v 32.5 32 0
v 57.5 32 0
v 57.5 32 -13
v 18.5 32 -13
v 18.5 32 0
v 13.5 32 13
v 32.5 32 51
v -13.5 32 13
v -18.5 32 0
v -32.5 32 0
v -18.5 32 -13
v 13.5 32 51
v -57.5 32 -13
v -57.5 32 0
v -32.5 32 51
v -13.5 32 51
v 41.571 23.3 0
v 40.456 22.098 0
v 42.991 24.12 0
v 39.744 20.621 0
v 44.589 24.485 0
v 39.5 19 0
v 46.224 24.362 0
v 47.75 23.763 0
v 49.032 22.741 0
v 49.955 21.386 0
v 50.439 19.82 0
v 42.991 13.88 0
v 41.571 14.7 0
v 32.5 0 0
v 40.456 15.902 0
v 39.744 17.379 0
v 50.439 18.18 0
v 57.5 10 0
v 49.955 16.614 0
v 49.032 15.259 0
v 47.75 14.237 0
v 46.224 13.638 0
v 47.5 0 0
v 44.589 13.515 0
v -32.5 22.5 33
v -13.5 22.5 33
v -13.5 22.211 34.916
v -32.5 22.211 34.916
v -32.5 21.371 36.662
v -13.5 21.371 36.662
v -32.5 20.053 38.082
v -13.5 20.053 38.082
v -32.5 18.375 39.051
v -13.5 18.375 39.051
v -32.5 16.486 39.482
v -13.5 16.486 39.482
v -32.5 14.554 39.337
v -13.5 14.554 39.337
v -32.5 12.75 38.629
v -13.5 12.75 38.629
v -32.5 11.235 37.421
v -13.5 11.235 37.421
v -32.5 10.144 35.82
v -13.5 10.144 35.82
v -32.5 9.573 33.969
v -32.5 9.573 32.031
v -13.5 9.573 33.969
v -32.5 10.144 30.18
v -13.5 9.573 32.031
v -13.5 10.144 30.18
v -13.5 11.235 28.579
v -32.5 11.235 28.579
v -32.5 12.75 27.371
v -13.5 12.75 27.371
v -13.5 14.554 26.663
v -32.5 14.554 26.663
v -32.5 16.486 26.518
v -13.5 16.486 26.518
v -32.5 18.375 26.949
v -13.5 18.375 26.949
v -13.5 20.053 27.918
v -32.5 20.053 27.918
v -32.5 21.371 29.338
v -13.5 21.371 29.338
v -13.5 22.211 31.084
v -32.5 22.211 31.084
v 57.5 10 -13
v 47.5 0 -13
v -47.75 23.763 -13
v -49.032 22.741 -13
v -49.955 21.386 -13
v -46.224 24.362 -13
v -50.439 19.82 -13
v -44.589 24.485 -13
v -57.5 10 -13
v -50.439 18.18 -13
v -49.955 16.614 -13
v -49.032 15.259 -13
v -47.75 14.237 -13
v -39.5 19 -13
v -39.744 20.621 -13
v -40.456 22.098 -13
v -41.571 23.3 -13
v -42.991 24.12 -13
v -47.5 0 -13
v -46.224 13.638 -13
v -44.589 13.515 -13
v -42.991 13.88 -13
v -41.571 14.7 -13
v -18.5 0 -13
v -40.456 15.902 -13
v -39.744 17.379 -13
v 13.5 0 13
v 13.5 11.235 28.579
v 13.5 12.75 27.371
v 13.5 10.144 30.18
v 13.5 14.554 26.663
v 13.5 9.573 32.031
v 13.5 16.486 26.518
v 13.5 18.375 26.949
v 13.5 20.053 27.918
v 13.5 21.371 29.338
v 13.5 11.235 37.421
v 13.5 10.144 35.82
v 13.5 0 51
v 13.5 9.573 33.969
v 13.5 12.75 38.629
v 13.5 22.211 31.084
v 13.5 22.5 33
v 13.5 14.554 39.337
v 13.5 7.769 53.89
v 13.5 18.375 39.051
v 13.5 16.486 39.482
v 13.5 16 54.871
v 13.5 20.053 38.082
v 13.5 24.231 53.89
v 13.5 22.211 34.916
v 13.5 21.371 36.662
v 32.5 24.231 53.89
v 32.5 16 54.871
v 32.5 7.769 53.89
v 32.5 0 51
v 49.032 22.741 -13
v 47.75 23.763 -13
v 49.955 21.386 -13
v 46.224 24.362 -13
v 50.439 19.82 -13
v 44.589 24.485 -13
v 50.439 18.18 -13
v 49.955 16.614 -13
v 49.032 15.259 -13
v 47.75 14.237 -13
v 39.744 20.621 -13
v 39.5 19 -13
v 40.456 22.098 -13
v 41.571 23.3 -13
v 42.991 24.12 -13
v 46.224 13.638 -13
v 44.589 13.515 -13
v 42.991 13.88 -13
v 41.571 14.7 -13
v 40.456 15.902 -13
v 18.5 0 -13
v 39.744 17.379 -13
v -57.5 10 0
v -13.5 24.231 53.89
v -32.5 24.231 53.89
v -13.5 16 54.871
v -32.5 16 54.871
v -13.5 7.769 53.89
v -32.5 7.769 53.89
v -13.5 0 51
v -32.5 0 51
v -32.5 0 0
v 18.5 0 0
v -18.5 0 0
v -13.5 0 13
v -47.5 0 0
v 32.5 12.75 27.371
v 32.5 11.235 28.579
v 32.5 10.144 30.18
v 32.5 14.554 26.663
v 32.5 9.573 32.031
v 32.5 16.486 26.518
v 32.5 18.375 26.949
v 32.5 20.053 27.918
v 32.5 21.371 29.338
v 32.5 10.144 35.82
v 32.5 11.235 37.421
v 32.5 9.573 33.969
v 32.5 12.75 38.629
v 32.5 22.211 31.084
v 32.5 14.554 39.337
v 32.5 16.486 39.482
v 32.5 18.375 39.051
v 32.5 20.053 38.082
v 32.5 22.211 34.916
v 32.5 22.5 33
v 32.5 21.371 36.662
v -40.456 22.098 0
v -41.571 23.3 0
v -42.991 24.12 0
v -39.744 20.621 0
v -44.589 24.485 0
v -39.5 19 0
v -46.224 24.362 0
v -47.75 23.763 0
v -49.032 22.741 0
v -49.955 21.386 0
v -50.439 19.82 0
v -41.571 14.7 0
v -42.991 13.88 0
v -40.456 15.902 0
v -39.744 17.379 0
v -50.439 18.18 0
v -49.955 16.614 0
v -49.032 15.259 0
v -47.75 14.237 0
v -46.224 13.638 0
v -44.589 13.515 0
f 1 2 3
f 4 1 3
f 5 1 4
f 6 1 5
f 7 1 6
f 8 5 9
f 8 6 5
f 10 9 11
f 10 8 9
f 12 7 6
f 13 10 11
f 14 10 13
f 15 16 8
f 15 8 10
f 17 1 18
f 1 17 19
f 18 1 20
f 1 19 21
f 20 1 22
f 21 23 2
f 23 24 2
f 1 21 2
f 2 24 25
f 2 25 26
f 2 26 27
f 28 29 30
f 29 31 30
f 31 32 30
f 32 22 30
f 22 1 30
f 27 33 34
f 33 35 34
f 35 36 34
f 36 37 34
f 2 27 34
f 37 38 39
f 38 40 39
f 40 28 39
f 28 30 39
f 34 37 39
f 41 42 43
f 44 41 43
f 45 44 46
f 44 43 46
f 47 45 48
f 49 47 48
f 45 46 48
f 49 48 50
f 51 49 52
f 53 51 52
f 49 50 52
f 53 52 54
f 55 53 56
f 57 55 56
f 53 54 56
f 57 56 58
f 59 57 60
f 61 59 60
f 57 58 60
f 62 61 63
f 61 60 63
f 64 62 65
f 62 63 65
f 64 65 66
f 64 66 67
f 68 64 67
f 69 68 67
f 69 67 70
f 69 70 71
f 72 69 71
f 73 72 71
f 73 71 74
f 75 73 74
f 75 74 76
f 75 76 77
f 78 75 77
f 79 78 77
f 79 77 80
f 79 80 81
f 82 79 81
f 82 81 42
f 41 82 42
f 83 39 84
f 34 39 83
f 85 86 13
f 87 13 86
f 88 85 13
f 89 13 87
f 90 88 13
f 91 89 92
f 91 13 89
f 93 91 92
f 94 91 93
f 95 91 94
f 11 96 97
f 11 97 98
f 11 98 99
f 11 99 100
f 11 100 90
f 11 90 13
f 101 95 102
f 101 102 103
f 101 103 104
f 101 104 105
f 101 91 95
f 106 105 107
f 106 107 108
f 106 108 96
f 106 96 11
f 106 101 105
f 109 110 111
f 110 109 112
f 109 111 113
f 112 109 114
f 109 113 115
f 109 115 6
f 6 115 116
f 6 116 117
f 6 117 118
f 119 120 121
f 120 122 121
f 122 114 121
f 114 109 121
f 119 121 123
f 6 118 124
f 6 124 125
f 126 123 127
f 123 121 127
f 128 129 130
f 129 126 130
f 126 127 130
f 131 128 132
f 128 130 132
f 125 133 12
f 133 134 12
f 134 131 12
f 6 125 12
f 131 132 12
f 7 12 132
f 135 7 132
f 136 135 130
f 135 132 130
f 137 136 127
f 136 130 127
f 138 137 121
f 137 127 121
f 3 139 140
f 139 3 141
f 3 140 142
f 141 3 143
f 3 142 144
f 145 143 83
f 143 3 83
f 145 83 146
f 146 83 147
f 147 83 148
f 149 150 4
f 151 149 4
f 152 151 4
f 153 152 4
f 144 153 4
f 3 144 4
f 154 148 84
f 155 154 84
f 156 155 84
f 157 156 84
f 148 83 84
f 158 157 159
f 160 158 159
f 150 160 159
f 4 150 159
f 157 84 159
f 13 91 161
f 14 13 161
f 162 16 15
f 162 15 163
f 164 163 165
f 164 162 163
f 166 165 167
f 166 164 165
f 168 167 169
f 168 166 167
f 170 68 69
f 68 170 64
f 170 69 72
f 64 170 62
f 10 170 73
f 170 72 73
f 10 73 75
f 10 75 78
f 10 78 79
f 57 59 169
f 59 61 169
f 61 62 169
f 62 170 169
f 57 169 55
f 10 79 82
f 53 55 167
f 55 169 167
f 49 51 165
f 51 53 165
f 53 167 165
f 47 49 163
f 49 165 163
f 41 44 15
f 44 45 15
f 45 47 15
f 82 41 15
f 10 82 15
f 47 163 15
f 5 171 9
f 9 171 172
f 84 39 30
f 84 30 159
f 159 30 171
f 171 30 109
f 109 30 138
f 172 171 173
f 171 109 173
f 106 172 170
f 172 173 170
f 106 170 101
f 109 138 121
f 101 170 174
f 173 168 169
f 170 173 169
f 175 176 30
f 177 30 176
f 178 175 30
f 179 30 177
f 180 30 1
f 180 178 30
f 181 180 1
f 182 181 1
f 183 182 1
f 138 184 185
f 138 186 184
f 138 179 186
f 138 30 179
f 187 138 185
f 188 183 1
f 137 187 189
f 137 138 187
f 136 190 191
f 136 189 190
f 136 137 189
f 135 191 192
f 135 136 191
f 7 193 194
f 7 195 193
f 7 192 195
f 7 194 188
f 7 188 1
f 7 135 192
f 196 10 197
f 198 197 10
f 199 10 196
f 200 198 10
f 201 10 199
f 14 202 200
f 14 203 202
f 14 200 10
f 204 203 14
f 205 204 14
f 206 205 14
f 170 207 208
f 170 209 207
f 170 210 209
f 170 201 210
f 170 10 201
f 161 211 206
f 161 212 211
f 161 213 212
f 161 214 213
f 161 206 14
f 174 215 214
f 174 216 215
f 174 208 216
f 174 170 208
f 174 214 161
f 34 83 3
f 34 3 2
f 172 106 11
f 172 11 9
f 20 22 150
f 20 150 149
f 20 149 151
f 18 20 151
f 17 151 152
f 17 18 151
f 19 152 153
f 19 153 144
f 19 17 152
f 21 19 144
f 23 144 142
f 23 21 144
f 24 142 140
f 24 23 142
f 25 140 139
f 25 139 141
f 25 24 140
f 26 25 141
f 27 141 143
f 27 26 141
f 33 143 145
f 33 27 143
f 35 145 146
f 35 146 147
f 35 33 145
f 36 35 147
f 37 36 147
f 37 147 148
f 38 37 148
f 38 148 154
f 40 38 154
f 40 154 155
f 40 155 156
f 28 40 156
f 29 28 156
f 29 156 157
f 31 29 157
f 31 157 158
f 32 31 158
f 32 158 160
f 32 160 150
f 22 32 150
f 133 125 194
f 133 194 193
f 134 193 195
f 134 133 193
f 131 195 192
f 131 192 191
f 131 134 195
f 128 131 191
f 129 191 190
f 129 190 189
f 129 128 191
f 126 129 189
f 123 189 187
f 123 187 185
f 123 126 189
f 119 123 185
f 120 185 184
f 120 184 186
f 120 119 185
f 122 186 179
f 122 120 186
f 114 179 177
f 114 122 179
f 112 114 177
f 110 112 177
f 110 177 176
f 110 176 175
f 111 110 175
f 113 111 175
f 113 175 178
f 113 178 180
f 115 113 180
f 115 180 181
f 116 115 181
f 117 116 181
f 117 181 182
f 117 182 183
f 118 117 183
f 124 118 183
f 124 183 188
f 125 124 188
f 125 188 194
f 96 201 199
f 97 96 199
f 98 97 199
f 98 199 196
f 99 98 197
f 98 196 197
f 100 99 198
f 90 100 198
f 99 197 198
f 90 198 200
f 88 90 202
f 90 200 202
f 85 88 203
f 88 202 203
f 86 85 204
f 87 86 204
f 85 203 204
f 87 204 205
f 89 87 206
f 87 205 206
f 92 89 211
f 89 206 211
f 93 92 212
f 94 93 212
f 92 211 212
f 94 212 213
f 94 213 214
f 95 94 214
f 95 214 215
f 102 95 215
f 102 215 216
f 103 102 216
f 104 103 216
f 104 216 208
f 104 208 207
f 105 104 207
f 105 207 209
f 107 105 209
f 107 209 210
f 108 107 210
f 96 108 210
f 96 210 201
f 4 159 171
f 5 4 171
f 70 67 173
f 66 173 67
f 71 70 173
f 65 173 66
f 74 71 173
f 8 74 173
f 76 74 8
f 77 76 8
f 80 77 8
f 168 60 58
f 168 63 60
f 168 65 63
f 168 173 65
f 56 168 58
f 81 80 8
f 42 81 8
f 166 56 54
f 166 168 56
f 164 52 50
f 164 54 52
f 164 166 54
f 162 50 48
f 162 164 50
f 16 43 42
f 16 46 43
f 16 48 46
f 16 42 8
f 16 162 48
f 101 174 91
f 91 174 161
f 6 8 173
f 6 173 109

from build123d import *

# Parameters (mm, degrees)
F0_W     = 10
F0_H     = 13
F1_DEPTH = 32
F2_R     = 5.5
F3_DEPTH = 25
F4_R     = 6.5
F5_DEPTH = 25
F7_DEPTH = 19


with BuildPart() as f1:
    # F0 (on Front) → F1 (new body)
    with BuildSketch(Plane.XZ):
        with Locations((-52.5, -6.5)):
            Rectangle(F0_W, F0_H)
        Polygon((-47.5, 0), (-47.5, -13), (-18.5, -13), (-18.5, 0), (0, 0), (0, 13), (-13.5, 13), (-13.5, 51), (-32.5, 51), (-32.5, 0), align=None)
    extrude(amount=-F1_DEPTH)

    # F2 (on face) → F3 (cut)
    with BuildSketch(Plane.XY):
        with Locations((-45, 19)):
            Circle(F2_R)
        Polygon((-57.5, 0), (-47.5, 0), (-57.5, 10), align=None)
    extrude(amount=-F3_DEPTH, mode=Mode.SUBTRACT)

    # F4 (on face) → F5 (cut)
    with BuildSketch(Plane.YZ.offset(-13.5)):
        with Locations((16, 33)):
            Circle(F4_R)
    extrude(amount=-F5_DEPTH, mode=Mode.SUBTRACT)

    # F6 (on face) → F7 (join)
    with BuildSketch(Plane.YZ.offset(-13.5)):
        with BuildLine():
            Line((0, 51), (32, 51))
            ThreePointArc((32, 51), (16, 54.871235), (0, 51))
        make_face()
    extrude(amount=-F7_DEPTH)

    # F8: F1 across plane


with BuildPart() as f1_1:
    add(f1.part)
    add(f1.part.mirror(Plane.YZ))


solid = f1_1.part
